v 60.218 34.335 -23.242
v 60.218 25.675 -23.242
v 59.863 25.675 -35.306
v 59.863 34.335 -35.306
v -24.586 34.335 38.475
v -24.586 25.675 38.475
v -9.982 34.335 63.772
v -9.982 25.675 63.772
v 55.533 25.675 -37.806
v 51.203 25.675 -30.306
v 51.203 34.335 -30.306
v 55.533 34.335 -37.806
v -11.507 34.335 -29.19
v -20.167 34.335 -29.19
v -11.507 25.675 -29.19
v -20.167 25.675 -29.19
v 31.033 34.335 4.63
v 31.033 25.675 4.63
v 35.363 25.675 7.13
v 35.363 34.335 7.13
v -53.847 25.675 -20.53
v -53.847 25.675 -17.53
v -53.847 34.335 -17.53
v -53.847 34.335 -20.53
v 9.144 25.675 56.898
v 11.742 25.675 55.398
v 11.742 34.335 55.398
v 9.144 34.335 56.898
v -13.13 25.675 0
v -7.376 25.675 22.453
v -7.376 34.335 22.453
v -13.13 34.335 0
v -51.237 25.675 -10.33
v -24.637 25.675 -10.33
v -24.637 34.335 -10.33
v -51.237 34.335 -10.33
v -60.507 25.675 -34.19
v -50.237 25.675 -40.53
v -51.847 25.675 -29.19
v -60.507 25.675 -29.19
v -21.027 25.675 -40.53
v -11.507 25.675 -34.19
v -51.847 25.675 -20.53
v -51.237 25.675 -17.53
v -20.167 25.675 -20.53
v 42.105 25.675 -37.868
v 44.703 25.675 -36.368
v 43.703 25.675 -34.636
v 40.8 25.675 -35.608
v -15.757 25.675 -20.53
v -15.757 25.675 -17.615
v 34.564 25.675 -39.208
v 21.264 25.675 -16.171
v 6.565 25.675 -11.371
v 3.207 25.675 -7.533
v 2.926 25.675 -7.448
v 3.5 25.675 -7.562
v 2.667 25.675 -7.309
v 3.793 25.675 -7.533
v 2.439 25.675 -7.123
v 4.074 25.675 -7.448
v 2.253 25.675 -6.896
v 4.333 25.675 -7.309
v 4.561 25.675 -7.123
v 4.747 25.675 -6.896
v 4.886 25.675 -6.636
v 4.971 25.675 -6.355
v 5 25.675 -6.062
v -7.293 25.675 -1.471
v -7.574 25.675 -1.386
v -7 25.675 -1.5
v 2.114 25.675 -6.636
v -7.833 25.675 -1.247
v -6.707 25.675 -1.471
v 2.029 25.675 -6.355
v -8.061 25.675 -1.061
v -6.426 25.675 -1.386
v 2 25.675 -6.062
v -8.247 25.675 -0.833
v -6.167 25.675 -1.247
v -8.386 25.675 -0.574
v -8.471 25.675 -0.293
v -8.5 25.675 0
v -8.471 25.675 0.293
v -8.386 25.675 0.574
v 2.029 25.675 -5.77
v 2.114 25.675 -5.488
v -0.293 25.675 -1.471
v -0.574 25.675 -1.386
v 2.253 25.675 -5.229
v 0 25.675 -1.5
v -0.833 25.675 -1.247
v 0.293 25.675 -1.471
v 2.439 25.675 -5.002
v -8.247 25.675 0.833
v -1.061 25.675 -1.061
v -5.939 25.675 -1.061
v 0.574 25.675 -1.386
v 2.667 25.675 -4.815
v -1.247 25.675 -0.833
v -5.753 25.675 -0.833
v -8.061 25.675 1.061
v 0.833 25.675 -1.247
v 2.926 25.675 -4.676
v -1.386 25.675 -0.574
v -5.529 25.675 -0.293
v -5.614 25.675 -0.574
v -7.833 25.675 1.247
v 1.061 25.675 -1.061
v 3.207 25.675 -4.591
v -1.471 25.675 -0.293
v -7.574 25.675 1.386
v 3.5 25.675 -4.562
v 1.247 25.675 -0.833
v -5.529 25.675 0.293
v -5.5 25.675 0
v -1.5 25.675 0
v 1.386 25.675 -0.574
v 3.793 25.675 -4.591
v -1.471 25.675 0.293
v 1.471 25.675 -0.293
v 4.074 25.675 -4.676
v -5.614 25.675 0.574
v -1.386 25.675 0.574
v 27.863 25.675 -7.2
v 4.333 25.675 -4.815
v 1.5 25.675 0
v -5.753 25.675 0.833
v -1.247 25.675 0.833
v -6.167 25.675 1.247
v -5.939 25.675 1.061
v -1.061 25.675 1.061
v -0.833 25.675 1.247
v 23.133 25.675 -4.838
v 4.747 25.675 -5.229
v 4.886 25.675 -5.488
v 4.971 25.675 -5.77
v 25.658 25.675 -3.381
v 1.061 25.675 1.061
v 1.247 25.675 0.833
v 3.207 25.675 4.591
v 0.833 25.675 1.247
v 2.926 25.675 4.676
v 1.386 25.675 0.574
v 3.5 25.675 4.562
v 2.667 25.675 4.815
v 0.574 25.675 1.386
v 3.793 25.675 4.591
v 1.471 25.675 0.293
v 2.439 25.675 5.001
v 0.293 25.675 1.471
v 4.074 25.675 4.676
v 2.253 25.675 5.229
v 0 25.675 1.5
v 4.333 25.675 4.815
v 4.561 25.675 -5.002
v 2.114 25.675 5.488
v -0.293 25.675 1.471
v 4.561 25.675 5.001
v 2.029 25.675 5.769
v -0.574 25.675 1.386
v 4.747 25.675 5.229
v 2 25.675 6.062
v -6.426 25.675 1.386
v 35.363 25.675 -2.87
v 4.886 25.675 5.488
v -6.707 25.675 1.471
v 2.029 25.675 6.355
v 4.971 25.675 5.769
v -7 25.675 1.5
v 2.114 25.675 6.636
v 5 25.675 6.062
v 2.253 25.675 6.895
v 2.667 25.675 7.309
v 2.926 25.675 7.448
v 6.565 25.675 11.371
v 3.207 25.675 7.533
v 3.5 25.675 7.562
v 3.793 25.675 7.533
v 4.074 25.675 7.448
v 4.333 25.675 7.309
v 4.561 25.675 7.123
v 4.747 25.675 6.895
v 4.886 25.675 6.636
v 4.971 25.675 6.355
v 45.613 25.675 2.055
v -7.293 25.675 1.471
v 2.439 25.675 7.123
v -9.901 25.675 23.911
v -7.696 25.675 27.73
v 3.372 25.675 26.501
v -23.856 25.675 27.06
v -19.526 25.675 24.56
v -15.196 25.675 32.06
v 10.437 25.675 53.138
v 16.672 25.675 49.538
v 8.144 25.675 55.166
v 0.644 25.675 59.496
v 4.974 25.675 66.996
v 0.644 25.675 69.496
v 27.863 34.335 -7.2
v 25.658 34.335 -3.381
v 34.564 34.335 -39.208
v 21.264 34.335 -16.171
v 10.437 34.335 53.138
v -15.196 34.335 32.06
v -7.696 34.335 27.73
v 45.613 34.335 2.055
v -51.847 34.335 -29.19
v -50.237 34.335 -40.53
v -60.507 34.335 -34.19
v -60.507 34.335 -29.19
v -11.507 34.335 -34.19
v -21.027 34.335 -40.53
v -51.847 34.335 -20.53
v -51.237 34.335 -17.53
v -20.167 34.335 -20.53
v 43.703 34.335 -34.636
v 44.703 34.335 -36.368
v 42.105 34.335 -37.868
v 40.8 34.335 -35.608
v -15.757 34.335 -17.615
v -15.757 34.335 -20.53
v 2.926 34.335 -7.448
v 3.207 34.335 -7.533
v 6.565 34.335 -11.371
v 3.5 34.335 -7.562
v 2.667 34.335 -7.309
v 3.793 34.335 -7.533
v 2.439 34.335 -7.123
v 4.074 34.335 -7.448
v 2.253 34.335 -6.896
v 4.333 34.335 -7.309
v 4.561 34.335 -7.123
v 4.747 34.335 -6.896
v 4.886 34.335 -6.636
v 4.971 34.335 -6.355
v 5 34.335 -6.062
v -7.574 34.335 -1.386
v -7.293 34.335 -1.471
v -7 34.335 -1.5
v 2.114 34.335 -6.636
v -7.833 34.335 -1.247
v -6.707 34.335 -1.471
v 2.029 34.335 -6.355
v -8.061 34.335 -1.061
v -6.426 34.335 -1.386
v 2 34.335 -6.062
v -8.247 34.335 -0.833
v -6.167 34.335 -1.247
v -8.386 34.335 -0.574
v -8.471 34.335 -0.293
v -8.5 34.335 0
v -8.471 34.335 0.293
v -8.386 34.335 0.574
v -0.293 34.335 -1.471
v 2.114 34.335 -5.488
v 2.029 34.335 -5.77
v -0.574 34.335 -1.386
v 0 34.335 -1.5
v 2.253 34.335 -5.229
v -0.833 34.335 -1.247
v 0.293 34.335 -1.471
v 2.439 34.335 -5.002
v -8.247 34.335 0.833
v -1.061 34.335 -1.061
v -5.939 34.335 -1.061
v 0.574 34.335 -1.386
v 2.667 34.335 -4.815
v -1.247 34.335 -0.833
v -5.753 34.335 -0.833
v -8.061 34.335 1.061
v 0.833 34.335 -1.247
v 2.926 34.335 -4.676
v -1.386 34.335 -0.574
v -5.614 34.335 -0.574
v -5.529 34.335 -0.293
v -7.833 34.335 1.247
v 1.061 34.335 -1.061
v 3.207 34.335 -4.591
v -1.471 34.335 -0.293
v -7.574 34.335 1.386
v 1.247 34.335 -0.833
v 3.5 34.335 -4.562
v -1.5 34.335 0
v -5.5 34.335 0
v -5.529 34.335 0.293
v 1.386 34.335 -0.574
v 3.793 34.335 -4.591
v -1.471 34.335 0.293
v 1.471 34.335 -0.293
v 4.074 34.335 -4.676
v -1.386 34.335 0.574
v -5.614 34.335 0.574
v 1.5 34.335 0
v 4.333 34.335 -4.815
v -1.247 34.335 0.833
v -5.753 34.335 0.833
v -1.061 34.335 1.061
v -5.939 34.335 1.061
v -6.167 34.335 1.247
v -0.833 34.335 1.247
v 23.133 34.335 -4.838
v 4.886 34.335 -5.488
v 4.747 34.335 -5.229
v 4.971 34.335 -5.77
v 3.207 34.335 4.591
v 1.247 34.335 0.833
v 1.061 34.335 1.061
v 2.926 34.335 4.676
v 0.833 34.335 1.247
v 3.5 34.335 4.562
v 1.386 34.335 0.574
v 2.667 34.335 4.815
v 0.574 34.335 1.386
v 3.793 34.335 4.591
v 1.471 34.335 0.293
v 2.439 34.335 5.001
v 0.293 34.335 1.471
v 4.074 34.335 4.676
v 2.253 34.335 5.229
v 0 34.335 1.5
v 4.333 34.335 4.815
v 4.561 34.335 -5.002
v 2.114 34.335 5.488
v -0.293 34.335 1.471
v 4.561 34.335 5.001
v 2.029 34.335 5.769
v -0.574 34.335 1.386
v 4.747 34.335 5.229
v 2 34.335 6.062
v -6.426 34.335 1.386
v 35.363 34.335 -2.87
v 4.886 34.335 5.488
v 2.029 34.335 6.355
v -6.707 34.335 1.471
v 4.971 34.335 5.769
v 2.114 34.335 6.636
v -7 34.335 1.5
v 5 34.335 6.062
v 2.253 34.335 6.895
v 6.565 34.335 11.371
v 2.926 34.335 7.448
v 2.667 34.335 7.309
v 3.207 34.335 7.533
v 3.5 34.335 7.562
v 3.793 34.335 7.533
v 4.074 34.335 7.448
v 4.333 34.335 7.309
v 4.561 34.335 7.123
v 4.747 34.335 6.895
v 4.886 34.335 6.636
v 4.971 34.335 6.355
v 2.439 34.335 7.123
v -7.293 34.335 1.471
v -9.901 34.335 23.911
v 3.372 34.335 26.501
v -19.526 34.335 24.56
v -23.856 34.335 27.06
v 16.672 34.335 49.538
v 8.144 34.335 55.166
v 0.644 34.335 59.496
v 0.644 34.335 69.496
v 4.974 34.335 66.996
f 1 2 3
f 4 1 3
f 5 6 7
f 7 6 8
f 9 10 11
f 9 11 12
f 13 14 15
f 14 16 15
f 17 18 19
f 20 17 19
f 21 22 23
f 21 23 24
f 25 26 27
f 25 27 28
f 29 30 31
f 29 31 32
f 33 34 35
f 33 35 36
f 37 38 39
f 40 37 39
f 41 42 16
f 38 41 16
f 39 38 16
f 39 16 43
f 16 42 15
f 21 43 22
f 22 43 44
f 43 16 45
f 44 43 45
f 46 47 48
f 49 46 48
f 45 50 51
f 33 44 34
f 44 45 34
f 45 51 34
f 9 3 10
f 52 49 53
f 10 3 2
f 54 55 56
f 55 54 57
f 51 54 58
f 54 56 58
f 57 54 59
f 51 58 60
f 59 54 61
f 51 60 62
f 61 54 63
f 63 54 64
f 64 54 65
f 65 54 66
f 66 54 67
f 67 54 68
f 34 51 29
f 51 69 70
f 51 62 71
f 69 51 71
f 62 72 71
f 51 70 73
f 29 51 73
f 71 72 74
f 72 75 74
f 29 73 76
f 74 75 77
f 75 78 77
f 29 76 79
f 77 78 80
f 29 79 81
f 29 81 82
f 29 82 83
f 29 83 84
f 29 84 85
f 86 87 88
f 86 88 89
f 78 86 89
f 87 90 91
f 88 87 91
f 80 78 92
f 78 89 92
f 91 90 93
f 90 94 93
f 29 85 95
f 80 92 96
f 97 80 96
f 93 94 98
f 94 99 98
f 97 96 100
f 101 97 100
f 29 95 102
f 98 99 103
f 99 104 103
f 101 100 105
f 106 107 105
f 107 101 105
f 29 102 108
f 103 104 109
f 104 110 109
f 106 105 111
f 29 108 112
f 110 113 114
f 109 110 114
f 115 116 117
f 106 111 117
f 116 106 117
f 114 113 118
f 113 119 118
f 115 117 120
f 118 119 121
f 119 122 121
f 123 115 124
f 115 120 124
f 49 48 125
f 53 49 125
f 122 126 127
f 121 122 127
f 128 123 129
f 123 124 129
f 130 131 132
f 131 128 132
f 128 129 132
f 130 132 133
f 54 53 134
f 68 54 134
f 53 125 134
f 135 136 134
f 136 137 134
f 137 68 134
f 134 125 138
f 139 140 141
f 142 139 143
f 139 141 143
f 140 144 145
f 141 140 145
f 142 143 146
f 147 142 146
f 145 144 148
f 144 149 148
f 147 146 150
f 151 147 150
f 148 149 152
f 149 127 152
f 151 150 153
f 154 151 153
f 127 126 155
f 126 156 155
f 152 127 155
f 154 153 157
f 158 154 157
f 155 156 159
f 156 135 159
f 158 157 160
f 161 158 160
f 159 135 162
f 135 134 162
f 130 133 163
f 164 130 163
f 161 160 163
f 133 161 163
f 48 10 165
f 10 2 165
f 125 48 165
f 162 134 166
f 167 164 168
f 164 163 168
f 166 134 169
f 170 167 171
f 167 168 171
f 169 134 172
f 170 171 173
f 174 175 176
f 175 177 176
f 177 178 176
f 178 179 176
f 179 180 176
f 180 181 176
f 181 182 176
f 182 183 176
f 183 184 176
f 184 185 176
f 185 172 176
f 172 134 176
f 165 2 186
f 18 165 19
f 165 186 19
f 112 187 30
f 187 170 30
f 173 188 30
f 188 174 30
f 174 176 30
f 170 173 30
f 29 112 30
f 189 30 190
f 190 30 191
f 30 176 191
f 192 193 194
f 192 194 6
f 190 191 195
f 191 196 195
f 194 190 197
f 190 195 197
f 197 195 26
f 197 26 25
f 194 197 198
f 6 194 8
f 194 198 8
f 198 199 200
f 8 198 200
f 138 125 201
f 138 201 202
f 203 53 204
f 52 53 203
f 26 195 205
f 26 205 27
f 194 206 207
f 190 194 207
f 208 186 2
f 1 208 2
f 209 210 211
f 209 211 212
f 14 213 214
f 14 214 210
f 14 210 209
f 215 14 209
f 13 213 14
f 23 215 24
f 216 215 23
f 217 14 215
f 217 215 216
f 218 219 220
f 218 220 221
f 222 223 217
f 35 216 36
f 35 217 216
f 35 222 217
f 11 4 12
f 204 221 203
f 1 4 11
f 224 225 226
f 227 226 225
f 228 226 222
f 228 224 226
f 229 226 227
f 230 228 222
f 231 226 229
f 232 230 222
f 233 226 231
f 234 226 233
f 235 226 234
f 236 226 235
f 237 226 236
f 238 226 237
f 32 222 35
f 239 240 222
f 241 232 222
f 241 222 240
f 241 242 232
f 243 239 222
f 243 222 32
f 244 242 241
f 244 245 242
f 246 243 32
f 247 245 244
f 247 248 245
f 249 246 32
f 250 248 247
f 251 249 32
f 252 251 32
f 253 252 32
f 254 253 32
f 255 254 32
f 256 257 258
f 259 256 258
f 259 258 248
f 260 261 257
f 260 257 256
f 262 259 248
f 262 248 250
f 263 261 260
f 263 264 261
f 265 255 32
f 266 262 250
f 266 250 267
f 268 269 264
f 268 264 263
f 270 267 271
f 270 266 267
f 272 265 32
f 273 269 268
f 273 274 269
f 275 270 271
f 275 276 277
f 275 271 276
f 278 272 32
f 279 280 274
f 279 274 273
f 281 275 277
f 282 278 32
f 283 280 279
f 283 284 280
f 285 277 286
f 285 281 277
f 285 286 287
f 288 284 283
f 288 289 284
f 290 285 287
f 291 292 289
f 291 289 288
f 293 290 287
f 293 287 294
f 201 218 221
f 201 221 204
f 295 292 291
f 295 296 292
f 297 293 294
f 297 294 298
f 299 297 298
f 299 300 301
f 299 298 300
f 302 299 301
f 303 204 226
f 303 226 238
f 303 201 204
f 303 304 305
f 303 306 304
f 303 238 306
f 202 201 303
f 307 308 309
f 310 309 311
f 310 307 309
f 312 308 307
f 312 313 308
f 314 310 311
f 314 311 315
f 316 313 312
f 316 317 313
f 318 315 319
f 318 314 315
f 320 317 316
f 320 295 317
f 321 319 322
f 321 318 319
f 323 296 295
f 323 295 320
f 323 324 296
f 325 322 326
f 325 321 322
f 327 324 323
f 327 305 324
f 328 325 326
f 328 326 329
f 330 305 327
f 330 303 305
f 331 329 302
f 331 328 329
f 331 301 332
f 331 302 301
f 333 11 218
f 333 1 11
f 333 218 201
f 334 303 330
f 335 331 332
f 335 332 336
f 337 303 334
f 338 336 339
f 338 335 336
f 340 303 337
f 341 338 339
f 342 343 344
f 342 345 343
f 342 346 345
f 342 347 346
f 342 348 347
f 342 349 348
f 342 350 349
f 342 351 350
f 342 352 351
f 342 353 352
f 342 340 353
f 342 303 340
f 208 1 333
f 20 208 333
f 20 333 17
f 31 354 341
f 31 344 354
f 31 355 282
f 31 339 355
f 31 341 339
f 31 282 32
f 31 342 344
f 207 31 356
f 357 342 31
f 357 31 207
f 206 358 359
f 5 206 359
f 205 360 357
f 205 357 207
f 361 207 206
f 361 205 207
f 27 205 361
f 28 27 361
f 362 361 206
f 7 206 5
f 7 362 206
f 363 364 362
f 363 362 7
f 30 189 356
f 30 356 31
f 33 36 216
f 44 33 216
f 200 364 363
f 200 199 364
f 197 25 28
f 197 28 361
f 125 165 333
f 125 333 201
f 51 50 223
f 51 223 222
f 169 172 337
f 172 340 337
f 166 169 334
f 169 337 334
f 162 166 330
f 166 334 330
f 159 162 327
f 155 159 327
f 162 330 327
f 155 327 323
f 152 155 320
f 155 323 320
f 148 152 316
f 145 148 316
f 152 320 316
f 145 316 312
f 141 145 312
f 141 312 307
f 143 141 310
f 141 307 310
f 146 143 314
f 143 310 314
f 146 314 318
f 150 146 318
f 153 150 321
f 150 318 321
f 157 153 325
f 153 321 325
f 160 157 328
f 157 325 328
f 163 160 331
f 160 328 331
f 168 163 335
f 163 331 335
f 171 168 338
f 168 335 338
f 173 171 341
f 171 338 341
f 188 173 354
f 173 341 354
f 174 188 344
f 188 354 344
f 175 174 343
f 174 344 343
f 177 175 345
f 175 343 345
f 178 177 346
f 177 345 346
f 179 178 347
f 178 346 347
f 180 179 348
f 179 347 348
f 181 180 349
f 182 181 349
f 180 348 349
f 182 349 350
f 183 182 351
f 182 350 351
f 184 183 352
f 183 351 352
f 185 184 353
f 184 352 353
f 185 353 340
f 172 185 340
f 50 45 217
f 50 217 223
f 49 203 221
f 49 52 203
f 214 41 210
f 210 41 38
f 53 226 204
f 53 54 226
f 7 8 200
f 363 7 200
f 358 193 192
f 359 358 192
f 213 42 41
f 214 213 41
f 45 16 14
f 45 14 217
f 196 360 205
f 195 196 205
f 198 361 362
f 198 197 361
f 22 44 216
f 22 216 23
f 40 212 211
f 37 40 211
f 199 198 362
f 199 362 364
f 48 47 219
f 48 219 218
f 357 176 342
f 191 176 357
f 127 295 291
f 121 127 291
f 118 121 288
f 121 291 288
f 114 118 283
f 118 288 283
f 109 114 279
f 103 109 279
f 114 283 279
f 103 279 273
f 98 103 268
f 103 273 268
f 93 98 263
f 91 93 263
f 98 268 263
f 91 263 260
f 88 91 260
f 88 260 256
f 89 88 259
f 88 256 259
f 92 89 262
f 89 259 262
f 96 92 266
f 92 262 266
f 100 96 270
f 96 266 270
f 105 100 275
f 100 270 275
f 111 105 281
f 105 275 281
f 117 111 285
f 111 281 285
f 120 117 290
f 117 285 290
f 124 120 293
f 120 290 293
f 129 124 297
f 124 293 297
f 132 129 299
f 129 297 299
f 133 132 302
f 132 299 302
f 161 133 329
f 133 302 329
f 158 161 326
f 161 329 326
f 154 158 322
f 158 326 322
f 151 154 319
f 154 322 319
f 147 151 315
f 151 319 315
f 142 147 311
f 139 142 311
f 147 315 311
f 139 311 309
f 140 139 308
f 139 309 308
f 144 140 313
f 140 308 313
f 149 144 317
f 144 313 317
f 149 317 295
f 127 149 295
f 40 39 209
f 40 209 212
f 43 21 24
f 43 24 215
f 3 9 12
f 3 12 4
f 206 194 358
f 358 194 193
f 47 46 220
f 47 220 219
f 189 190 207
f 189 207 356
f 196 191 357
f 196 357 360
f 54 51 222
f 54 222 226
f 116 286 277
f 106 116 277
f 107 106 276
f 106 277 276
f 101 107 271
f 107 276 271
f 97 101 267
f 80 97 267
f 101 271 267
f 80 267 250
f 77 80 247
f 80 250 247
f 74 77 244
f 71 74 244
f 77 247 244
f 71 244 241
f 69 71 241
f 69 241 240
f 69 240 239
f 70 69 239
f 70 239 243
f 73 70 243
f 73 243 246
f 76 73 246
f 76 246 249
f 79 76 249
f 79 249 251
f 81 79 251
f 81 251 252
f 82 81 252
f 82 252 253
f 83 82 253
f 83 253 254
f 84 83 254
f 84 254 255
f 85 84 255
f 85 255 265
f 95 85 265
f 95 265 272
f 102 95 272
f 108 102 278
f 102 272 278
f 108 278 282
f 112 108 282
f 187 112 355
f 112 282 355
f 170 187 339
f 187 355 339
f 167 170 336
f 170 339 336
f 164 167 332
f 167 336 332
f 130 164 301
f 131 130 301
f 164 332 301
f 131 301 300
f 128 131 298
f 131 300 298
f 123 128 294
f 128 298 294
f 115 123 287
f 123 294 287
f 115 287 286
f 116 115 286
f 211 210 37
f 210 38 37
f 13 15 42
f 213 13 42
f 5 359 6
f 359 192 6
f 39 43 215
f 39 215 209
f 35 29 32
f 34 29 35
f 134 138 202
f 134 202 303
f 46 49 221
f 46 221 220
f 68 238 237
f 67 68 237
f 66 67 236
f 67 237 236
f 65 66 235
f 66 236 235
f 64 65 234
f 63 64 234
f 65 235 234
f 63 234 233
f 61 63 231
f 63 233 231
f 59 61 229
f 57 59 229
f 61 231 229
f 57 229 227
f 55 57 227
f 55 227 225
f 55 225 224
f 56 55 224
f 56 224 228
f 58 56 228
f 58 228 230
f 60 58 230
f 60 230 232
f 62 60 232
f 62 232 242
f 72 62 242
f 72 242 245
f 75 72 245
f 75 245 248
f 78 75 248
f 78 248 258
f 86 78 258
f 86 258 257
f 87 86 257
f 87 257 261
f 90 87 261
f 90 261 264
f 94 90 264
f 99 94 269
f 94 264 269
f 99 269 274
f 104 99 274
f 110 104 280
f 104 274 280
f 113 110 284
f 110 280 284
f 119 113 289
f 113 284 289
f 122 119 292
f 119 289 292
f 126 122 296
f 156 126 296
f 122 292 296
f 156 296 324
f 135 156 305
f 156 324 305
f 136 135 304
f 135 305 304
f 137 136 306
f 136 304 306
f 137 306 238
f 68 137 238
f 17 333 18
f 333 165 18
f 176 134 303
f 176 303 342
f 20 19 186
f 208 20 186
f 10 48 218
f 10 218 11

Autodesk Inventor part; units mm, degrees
ref_plane "YZ Plane" through (0, 0, 0) normal (1, 0, 0) x (0, 1, 0)
ref_plane "XZ Plane" through (0, 0, 0) normal (0, 1, 0) x (-1, 0, 0)
ref_plane "XY Plane" through (0, 0, 0) normal (0, 0, 1) x (1, 0, 0)
ref_plane "Work Plane3" through (-98.2192, 25.6748, -72.651) normal (0, 1, 0) x (1, 0, 0)
sketch "Sketch1" plane through (-98.2192, 25.6748, -72.651) normal (0, 1, 0) x (1, 0, 0)
  line L0 (108.2722, -112.7231) -> (109.1382, -112.2231) construction
  line L1 (108.6382, -111.3571) -> (109.1382, -112.2231) construction
  line L2 (101.5917, -99.1522) -> (114.8917, -122.1885)
  line L3 (114.8917, -122.1885) -> (108.6563, -125.7885)
  line L4 (108.6563, -125.7885) -> (109.9613, -128.0488)
  line L5 (109.9613, -128.0488) -> (107.3632, -129.5488)
  line L6 (107.3632, -129.5488) -> (106.3632, -127.8168)
  line L7 (106.3632, -127.8168) -> (98.8635, -132.1468)
  line L8 (98.8635, -132.1468) -> (103.1935, -139.6466)
  line L9 (79.4712, -121.2385) -> (82.4842, -126.4571) construction
  line L10 (103.1935, -139.6466) -> (98.8633, -142.1466)
  line L11 (83.0235, -104.7111) -> (90.5232, -100.3811)
  line L12 (90.5232, -100.3811) -> (88.3182, -96.5619)
  line L13 (88.3182, -96.5619) -> (90.8427, -95.1044)
  line L14 (83.0235, -104.7111) -> (78.6935, -97.2113)
  line L15 (73.6327, -111.1259) -> (88.2377, -136.4225)
  line L16 (78.6935, -97.2113) -> (74.3633, -99.7113)
  line L17 (90.8427, -95.1044) -> (85.0892, -72.651)
  line L18 (104.7842, -84.0219) -> (98.2192, -72.651)
  line L19 (98.2192, -72.651) -> (85.0892, -72.651)
  line L20 (88.2377, -136.4225) -> (98.8633, -142.1466)
  line L21 (74.3633, -99.7113) -> (73.6327, -111.1259)
  line L22 (98.2192, -72.651) -> (104.7842, -84.0219)
  line L23 (104.7842, -84.0219) -> (101.5917, -99.1522)
  dimension "d1" = 26.6
  dimension "d4" = 7.2
  dimension "d5" = 2.61
  dimension "d6" = 3
  dimension "d7" = 2
  dimension "d8" = 8.66
  dimension "d9" = 8.66
  dimension "d10" = 5
  dimension "d11" = 8.66
  dimension "d12" = 31.68
  dimension "d13" = 4.41
  dimension "d14" = 2.915
  dimension "d17" = 8.66
  dimension "d18" = 29.21
  dimension "d20" = 10.27
  dimension "d21" = 5
  dimension "d22" = 23.1789
  dimension "d23" = 13.13
  dimension "d31" = 13.13
extrude "Extrusion1" add sketch "Sketch1" along normal blind 8.66
pattern_circular "Circular Pattern2" count 3 over 360 about axis through (0, 25.6748, 0) along (0, 1, 0) of "Extrusion1"
sketch "Sketch2" plane through (-98.2192, 34.3348, -72.651) normal (0, 1, 0) x (1, 0, 0)
  line L0 (46.9822, -62.321) -> (73.5822, -62.321) projected
  line L1 (114.8917, -122.1885) -> (101.5917, -99.1522) projected
  circle A0 centre (98.2192, -72.651) radius 1.5
  line L2 (98.2192, -72.651) -> (104.7842, -84.0219) construction
  line L3 (98.2192, -72.651) -> (85.0892, -72.651) construction
  line L4 (98.2192, -72.651) -> (104.7842, -61.28) construction
  circle A1 centre (98.2192, -72.651) radius 7 construction
  circle A2 centre (101.7192, -78.7131) radius 1.5
  circle A3 centre (101.7192, -66.5888) radius 1.5
  circle A4 centre (91.2192, -72.651) radius 1.5
  dimension "d35" = 3
  dimension "d36" = 14
  dimension "d37" = 3
  dimension "d38" = 3
  dimension "d39" = 3
extrude "Extrusion2" cut sketch "Sketch2" against normal blind 10
